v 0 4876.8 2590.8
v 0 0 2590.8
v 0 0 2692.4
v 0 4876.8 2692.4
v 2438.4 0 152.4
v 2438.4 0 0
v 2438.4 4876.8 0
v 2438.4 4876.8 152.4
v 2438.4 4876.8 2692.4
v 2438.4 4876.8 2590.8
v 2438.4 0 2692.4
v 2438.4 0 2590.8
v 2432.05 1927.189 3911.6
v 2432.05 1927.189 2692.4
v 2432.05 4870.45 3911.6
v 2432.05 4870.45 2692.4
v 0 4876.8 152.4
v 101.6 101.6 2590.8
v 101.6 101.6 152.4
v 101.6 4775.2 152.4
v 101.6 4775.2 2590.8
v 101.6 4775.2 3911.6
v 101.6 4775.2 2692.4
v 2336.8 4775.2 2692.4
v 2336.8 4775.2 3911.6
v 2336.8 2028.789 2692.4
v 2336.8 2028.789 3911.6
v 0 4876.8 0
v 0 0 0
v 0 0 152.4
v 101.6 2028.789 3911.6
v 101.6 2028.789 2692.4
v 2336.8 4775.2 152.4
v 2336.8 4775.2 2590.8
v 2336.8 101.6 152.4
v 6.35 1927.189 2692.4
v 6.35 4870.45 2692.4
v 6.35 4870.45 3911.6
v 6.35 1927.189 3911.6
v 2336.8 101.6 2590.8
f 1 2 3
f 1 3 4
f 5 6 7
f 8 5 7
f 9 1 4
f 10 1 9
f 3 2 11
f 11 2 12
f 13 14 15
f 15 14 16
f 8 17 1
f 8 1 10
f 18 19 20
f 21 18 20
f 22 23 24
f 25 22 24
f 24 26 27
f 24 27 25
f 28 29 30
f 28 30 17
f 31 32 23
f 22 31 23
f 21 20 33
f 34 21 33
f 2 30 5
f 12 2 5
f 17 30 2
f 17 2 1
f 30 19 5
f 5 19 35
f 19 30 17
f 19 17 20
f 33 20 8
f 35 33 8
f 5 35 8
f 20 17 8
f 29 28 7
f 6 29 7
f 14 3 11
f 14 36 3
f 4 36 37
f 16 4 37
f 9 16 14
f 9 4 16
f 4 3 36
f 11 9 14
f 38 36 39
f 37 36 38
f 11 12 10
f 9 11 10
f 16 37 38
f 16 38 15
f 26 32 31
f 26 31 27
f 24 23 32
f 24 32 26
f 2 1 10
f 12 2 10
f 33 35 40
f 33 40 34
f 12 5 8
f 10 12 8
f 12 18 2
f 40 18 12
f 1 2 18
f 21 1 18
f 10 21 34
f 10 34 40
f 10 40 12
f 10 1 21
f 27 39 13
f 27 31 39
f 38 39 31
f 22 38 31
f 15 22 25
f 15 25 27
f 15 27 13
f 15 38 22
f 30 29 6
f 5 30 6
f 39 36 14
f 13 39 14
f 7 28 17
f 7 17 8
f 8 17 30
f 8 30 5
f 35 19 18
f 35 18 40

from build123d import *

# Parameters (mm, degrees)
F0_W     = 2438.4
F0_H     = 4876.8
F1_DEPTH = 152.4
F2_W     = 2438.4
F2_H     = 4876.8
F2_W_2   = 2235.2
F2_H_2   = 4673.6
F3_DEPTH = 2438.4
F4_W     = 2438.4
F4_H     = 4876.8
F5_DEPTH = 101.6
F6_W     = 2425.7
F6_H     = 2943.261365
F6_W_2   = 2235.2
F6_H_2   = 2746.411365
F7_DEPTH = 1219.2


with BuildPart() as f1:
    # F0 (on Top) → F1 (new body)
    with BuildSketch(Plane.XY):
        with Locations((1219.2, 2438.4)):
            Rectangle(F0_W, F0_H)
    extrude(amount=F1_DEPTH)


with BuildPart() as f3:
    # F2 (on face) → F3 (new body)
    with BuildSketch(Plane.XY.offset(152.4)):
        with Locations((1219.2, 2438.4)):
            Rectangle(F2_W, F2_H)
        with Locations((1219.2, 2438.4)):
            Rectangle(F2_W_2, F2_H_2, mode=Mode.SUBTRACT)
    extrude(amount=F3_DEPTH)


with BuildPart() as f5:
    # F4 (on face) → F5 (new body)
    with BuildSketch(Plane.XY.offset(2590.8)):
        with Locations((1219.2, 2438.4)):
            Rectangle(F4_W, F4_H)
    extrude(amount=F5_DEPTH)

    # F6 (on face) → F7 (join)
    with BuildSketch(Plane.XY.offset(2692.4)):
        with Locations((1219.2, 3398.819317)):
            Rectangle(F6_W, F6_H)
        with Locations((1219.2, 3401.994317)):
            Rectangle(F6_W_2, F6_H_2, mode=Mode.SUBTRACT)
    extrude(amount=F7_DEPTH)


solid = Compound([f1.part, f3.part, f5.part])
